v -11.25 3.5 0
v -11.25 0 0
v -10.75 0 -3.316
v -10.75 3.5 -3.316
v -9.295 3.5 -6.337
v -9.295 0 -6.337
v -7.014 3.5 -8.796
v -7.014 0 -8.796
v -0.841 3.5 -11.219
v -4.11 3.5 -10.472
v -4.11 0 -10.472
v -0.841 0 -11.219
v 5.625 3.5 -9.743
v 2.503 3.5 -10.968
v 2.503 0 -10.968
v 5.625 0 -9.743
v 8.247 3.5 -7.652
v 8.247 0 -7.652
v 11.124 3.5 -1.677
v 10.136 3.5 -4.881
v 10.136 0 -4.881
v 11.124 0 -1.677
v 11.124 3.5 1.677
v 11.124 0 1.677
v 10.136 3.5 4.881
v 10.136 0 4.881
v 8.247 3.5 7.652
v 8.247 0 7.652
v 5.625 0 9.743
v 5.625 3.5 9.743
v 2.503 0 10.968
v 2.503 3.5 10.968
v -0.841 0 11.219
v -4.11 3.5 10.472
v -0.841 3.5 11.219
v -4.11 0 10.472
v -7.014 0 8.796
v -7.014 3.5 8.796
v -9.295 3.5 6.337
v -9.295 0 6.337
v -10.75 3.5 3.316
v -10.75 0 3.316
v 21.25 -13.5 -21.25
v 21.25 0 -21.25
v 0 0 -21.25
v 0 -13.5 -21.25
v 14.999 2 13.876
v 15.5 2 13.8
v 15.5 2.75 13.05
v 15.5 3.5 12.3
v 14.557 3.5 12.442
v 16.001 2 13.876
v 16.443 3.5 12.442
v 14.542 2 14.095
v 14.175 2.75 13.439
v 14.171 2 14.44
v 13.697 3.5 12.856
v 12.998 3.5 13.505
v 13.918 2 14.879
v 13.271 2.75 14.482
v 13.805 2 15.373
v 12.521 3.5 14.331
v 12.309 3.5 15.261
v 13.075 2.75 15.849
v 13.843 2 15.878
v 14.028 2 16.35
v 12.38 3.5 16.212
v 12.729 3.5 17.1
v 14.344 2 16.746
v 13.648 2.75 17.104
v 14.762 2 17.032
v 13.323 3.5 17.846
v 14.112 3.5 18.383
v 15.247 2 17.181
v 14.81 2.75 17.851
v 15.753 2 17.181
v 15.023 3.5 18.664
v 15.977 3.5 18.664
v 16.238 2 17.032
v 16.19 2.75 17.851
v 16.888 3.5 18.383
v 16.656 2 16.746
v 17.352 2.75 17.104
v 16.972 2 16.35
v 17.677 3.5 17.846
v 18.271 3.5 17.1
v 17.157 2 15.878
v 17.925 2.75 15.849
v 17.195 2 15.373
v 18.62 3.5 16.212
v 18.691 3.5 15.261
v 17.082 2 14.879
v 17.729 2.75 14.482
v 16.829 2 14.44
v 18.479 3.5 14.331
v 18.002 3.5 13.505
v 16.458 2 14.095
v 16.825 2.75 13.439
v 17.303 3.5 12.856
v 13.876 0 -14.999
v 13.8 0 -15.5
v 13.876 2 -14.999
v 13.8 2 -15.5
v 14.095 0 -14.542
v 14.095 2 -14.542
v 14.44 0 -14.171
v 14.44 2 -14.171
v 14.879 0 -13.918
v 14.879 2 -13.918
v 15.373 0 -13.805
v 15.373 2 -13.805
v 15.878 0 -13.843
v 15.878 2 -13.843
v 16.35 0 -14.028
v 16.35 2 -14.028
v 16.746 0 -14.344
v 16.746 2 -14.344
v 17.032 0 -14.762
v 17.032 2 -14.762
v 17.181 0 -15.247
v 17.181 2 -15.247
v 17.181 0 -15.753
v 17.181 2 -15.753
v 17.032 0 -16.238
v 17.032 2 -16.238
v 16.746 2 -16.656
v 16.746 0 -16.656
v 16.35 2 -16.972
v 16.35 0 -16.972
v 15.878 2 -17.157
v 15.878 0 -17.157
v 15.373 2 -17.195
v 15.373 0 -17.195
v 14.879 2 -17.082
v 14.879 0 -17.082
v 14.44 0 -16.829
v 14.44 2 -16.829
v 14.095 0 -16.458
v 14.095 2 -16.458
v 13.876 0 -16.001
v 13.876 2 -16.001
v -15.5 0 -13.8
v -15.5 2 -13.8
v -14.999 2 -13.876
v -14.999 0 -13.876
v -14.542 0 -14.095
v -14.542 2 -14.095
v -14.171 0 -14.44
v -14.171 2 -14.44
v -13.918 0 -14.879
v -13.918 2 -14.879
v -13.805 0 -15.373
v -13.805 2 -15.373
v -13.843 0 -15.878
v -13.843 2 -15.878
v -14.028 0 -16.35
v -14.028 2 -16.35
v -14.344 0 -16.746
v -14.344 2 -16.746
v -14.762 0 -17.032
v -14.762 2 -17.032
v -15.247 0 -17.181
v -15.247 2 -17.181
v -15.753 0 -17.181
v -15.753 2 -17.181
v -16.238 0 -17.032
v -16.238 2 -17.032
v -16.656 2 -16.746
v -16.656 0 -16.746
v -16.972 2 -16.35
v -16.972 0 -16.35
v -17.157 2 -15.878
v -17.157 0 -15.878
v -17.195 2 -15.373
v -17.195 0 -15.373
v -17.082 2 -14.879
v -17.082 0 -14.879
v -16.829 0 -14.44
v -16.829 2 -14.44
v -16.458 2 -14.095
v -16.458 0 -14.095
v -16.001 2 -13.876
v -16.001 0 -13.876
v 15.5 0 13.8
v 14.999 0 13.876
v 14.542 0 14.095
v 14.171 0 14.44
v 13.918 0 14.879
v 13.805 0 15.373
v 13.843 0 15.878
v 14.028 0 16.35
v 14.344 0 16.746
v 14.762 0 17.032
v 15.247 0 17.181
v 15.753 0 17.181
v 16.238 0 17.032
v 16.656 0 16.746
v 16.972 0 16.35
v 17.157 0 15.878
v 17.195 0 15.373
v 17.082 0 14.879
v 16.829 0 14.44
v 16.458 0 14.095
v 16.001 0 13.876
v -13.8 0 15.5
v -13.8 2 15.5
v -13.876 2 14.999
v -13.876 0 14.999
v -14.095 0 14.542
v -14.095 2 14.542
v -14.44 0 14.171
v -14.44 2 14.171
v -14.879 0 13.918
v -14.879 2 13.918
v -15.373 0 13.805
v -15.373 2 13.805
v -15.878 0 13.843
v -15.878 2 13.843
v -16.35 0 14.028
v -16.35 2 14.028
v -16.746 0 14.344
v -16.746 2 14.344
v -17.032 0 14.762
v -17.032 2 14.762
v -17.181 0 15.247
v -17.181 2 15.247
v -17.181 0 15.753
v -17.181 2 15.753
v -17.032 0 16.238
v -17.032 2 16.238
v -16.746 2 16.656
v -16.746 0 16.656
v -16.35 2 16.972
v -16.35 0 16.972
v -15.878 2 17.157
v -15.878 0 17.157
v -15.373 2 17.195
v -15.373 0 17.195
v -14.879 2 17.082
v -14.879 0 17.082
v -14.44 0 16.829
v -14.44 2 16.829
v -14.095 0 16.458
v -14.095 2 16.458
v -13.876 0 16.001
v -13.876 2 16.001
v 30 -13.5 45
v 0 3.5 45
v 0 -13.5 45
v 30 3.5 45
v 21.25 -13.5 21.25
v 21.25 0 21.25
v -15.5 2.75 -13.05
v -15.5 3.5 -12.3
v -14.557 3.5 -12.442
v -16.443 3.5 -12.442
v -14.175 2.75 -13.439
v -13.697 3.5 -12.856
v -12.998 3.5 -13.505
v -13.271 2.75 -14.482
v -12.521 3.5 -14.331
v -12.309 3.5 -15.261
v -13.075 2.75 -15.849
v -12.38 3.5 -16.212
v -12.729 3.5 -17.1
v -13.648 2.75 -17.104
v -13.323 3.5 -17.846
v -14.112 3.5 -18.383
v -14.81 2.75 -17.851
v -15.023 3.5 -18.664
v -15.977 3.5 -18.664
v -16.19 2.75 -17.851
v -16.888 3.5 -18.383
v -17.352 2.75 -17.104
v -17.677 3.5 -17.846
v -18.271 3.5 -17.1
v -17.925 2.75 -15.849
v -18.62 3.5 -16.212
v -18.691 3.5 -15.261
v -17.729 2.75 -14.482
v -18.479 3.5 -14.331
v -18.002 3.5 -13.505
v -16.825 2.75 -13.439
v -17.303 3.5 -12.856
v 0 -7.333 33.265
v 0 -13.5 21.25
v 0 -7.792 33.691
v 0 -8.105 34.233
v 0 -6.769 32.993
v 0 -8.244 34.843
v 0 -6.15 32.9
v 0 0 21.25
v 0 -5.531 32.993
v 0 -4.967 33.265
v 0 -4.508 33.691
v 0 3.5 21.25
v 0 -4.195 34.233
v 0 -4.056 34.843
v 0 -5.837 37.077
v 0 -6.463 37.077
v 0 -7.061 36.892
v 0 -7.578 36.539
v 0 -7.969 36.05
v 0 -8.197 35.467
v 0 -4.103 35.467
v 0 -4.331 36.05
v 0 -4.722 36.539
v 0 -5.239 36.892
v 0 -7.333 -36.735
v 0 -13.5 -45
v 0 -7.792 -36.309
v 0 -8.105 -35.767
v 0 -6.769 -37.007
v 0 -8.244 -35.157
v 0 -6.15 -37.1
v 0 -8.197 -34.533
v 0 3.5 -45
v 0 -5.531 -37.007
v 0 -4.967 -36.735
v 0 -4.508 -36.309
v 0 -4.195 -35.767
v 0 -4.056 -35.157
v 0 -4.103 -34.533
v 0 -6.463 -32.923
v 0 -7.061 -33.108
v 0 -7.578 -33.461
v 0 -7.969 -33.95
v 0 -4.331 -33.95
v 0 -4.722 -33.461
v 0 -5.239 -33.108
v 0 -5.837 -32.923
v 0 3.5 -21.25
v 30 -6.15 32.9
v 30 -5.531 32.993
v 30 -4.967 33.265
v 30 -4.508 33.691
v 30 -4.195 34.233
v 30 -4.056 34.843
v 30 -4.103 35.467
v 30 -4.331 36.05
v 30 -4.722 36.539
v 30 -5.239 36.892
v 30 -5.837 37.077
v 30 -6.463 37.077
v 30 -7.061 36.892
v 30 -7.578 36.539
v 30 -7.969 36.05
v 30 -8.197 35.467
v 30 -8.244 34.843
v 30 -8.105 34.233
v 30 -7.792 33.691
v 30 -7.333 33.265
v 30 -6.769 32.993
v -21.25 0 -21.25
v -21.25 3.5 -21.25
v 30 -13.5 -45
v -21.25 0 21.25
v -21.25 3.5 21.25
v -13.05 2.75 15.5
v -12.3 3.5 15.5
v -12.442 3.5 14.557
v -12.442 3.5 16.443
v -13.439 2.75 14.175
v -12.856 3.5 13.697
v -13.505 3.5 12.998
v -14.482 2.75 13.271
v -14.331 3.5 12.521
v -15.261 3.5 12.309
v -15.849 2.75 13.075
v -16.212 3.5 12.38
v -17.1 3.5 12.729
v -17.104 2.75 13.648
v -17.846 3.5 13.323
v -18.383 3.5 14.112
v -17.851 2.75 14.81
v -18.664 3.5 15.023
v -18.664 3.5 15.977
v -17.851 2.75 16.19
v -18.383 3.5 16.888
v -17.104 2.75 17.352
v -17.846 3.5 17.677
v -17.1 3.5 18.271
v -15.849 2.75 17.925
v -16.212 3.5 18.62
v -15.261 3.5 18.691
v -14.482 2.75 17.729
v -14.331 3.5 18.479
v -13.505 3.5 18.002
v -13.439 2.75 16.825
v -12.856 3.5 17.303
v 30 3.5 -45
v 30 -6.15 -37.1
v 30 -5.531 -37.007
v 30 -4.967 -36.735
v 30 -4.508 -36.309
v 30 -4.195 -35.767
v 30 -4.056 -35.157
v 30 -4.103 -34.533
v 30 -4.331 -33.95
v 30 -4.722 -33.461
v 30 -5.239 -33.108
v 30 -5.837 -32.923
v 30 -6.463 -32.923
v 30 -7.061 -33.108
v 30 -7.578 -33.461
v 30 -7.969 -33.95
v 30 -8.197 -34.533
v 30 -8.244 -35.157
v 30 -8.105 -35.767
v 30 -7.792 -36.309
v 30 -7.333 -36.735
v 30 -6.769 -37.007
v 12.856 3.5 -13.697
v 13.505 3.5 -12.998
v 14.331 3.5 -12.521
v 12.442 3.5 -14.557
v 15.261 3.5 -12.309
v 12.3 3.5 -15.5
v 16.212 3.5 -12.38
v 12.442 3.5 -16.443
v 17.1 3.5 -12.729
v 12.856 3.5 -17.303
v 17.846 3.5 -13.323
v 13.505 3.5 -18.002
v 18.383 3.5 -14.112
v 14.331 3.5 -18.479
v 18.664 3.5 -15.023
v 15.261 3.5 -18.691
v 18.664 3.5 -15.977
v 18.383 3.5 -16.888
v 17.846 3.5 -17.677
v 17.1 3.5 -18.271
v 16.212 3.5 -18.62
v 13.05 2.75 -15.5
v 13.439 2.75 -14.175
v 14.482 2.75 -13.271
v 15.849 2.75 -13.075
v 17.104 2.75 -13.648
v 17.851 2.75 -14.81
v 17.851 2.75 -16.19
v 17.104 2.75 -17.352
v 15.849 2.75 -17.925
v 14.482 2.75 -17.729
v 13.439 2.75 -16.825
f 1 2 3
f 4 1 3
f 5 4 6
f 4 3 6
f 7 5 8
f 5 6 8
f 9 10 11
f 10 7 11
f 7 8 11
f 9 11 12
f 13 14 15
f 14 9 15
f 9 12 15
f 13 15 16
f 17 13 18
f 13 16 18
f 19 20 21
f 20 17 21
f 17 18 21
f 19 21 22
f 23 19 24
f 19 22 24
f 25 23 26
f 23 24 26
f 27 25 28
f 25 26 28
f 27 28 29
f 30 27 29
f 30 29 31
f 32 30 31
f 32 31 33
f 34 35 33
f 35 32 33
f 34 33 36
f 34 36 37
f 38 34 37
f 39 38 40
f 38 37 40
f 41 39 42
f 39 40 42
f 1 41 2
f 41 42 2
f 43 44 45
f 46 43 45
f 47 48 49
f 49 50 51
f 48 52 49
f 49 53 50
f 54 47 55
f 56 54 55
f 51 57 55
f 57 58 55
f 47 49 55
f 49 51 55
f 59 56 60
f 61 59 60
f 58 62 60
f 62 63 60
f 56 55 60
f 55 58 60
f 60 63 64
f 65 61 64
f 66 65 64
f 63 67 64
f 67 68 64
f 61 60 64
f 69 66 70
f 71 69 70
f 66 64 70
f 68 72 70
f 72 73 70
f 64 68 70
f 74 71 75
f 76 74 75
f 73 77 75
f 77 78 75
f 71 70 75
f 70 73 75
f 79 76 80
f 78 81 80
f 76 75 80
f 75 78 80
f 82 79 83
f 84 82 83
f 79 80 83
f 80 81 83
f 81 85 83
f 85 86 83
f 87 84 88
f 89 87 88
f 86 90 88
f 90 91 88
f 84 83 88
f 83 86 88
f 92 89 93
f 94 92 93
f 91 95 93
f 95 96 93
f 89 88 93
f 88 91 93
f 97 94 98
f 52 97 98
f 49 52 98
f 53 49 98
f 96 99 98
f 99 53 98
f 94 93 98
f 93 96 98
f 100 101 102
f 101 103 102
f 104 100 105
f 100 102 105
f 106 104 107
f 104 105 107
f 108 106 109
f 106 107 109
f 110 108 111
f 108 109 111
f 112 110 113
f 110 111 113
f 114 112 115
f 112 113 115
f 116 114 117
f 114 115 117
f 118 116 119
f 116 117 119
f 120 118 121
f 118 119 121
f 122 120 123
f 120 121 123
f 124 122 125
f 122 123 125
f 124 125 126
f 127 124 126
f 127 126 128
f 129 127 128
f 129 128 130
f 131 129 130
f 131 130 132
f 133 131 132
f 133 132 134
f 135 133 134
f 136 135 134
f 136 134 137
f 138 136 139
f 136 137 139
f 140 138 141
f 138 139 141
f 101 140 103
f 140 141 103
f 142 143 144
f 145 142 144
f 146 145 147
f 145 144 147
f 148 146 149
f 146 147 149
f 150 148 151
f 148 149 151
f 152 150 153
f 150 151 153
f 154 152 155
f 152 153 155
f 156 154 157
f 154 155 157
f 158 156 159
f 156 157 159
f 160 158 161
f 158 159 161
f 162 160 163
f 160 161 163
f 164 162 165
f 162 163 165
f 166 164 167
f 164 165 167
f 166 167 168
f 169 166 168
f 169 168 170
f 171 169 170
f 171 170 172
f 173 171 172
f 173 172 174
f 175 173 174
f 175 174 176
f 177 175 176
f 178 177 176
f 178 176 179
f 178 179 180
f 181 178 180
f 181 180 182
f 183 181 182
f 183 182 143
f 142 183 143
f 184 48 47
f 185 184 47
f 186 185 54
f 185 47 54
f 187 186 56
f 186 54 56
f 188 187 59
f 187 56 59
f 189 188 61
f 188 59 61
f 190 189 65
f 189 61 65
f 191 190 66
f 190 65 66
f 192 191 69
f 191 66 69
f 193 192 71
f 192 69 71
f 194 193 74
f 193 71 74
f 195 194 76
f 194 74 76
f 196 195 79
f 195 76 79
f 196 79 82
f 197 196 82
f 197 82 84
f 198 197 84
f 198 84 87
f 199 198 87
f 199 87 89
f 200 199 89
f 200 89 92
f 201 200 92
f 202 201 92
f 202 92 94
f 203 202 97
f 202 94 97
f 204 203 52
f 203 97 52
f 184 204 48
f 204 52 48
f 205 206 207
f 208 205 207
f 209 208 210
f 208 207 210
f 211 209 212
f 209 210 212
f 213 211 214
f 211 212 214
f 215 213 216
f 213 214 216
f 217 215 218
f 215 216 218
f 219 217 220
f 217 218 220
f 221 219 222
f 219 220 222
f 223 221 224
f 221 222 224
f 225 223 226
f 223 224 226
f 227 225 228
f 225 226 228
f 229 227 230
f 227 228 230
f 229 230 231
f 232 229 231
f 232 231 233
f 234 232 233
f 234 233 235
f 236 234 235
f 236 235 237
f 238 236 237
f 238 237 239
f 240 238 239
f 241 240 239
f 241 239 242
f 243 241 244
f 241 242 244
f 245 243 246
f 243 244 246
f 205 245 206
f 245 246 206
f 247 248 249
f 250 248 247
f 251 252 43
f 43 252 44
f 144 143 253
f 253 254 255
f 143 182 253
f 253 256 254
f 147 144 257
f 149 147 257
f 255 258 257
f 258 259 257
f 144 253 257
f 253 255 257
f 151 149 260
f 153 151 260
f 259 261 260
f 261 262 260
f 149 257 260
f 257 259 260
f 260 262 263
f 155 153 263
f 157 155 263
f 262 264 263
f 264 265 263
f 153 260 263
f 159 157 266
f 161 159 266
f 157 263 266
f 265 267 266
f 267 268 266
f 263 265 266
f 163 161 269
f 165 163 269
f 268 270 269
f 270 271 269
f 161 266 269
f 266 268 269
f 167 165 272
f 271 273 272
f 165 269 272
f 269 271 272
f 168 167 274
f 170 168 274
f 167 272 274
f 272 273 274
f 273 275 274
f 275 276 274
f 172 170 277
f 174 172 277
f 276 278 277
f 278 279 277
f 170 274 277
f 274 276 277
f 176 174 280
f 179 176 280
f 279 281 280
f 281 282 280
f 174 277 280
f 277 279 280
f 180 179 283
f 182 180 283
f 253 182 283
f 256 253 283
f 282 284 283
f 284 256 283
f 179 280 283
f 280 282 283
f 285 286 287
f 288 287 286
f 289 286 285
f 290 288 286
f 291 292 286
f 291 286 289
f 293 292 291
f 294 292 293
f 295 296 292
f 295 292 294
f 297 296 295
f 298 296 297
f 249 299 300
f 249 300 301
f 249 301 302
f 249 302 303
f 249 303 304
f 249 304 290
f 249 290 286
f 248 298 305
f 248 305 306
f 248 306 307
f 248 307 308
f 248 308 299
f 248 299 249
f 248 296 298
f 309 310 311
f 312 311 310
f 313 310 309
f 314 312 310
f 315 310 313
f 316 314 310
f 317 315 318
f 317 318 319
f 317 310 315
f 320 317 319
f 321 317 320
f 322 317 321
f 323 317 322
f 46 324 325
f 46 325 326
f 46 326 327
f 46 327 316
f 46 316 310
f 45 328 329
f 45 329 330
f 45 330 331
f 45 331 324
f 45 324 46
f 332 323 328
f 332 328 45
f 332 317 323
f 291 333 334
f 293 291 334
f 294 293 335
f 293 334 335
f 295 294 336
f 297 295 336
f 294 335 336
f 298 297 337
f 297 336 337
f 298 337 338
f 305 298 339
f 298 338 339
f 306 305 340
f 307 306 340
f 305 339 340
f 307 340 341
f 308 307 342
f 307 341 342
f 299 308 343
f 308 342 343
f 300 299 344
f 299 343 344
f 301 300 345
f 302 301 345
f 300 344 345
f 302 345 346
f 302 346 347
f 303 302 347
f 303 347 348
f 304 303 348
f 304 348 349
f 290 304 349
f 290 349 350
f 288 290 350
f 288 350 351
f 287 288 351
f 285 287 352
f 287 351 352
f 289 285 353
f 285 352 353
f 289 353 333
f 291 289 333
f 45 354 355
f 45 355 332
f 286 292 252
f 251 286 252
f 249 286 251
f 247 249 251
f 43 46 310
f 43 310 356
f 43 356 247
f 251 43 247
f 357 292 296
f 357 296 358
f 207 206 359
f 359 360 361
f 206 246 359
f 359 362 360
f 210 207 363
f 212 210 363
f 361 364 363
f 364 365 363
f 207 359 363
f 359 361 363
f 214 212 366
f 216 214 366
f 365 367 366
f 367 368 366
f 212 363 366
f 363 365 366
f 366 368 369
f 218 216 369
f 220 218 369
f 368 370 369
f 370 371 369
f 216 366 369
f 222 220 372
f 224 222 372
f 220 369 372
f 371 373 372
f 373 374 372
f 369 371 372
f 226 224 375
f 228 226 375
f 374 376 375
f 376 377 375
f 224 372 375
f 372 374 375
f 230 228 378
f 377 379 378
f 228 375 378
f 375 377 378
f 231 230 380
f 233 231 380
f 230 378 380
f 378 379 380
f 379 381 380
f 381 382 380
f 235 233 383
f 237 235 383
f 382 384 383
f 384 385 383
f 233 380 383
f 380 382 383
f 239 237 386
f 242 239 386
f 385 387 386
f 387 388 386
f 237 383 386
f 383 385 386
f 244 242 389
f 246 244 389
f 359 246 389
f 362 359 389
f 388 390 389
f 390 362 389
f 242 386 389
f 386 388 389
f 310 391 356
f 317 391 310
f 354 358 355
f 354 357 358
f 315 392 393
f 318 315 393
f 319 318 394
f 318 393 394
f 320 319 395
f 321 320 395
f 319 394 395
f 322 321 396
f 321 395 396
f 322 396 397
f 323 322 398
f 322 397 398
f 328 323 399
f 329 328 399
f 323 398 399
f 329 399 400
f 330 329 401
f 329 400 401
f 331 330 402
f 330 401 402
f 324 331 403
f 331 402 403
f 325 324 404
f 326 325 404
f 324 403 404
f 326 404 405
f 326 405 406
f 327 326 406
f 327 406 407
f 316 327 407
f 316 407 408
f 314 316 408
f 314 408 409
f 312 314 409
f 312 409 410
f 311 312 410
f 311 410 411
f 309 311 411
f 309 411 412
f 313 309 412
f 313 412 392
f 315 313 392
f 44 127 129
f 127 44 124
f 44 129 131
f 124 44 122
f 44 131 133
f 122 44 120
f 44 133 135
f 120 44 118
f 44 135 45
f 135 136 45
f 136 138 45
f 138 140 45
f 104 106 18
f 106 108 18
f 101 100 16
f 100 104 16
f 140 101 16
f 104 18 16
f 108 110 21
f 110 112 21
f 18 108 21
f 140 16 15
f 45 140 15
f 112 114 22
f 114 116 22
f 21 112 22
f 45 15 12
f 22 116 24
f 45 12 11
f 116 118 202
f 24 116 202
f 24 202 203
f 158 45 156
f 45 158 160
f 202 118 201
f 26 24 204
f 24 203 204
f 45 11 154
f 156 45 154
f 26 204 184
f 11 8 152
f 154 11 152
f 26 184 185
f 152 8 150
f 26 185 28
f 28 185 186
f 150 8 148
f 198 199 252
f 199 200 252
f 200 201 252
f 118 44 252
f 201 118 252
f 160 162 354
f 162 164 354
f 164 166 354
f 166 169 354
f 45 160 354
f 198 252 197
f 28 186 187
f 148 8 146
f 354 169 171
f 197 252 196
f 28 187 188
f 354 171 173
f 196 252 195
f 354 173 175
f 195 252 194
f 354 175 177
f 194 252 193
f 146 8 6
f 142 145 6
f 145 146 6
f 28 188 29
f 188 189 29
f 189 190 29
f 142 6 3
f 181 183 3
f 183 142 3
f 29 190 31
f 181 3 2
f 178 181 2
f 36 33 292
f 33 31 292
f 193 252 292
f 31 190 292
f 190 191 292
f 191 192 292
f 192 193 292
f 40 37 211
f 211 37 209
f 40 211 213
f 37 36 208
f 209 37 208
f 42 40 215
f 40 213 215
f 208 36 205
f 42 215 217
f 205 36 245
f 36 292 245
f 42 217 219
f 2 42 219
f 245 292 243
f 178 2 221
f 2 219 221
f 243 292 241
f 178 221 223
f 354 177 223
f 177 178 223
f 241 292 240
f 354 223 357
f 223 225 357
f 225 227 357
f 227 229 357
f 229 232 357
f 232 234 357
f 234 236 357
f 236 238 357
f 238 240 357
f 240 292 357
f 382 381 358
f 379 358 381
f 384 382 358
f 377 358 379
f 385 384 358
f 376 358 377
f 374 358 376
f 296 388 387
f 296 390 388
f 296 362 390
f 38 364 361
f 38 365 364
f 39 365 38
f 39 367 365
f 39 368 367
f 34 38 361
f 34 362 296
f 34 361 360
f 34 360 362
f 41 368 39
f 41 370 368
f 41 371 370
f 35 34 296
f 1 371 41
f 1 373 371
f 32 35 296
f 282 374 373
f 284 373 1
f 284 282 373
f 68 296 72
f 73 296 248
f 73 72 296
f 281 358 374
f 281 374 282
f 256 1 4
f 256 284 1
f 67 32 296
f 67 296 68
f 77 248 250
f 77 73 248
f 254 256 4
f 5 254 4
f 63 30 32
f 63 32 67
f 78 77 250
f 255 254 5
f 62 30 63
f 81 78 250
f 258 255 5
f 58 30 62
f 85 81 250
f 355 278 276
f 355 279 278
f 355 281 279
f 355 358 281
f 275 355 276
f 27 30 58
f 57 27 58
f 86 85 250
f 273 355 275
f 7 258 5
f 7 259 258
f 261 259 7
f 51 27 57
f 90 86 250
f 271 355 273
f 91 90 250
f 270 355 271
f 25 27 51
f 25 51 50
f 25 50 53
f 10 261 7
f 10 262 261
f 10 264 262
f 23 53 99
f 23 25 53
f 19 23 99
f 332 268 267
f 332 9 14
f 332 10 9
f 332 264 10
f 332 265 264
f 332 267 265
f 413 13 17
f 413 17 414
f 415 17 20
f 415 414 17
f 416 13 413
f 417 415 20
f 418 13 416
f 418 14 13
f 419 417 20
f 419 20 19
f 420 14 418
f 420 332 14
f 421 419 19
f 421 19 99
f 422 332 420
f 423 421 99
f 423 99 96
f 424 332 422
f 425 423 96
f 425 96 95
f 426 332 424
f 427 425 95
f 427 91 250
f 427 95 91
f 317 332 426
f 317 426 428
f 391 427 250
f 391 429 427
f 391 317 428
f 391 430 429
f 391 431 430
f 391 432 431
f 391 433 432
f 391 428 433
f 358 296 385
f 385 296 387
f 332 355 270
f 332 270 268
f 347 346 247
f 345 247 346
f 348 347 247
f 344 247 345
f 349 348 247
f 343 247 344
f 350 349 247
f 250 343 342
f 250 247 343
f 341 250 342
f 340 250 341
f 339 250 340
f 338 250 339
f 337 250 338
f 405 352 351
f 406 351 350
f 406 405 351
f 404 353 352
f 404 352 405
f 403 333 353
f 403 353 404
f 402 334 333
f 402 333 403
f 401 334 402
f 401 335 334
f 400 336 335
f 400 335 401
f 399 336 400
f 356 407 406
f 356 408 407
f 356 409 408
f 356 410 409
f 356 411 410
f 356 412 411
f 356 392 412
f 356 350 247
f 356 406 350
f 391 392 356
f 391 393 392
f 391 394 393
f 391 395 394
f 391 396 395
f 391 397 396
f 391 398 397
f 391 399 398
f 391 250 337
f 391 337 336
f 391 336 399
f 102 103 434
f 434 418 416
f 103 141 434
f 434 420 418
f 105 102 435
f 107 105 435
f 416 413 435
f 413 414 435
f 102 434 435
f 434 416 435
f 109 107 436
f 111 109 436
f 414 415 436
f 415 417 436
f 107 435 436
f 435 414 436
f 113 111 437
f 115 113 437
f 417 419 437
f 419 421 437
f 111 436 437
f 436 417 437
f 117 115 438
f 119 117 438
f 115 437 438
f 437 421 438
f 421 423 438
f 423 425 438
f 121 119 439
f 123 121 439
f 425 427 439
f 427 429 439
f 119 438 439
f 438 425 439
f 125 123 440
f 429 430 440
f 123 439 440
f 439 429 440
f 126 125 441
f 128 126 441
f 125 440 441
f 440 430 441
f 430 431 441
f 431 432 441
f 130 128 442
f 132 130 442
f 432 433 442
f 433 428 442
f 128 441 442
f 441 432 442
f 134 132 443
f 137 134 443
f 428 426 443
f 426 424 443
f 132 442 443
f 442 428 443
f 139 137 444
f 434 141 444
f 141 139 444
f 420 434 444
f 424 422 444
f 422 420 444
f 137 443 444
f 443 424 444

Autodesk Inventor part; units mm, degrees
ref_plane "YZ Plane" through (0, 0, 0) normal (1, 0, 0) x (0, 1, 0)
ref_plane "XZ Plane" through (0, 0, 0) normal (0, 1, 0) x (-1, 0, 0)
ref_plane "XY Plane" through (0, 0, 0) normal (0, 0, 1) x (1, 0, 0)
sketch "Boceto1" plane through (0, 0, 0) normal (0, 1, 0) x (-1, 0, 0)
  circle A0 centre (0, 0) radius 11.25
  line L0 (-21.25, 21.25) -> (21.25, 21.25)
  line L1 (21.25, 21.25) -> (21.25, -21.25)
  line L2 (21.25, -21.25) -> (-21.25, -21.25)
  line L3 (-21.25, -21.25) -> (-21.25, 21.25)
  line L4 (-21.25, 21.25) -> (21.25, -21.25) construction
  line L5 (21.25, 21.25) -> (-21.25, -21.25) construction
  dimension "d0" = 22.5
  dimension "d1" = 42.5
  dimension "d2" = 42.5
extrude "Extrusión1" add sketch "Boceto1" along normal blind 3.5
sketch "Boceto2" plane through (0, 3.5, 0) normal (0, 1, 0) x (1, 0, 0)
  circle A0 centre (-15.5, -15.5) radius 1.7
  point P0 (0, 0)
  dimension "d5" = 15.5
  dimension "d6" = 15.5
  dimension "d7" = 3.4
extrude "Extrusión2" cut sketch "Boceto2" against normal through all
chamfer "Chaflán1" distance 1.5 angle 45 1 edges at (-17.2, 3.5, 15.5)
pattern_circular "Patrón circular1" count 4 over 360 about axis through (0, 0, 0) along (0, 1, 0) of "Extrusión2", "Chaflán1"
sketch "Boceto3" plane through (0, 3.5, 0) normal (0, 1, 0) x (1, 0, 0)
  circle A0 centre (15.5, 15.5) radius 3.2 projected
  circle A1 centre (-15.5, -15.5) radius 3.2 projected
  line L0 (21.25, 21.25) -> (-21.25, 21.25) projected
  line L1 (-21.25, 21.25) -> (-21.25, -21.25) projected
  line L2 (-21.25, -21.25) -> (21.25, -21.25) projected
  line L3 (21.25, -21.25) -> (21.25, 21.25) projected
  circle A2 centre (0, 0) radius 11.25 projected
  circle A3 centre (15.5, -15.5) radius 3.2 projected
  circle A4 centre (-15.5, 15.5) radius 3.2 projected
  line L4 (0, -45) -> (30, -45)
  line L5 (30, -45) -> (30, 45)
  line L6 (30, 45) -> (0, 45)
  line L7 (0, 45) -> (0, -45)
  point P0 (0, -21.25)
  point P1 (0, 21.25)
  dimension "d16" = 90
  dimension "d17" = 45
  dimension "d18" = 0
  dimension "d19" = 30
extrude "Extrusión3" add sketch "Boceto3" against normal blind 17 contours L0 L7 L6 L5 L4 L2 L3
sketch "Boceto4" plane through (30, 3.5, 45) normal (1, 0, 0) x (0, 0, -1)
  circle A0 centre (10, -9.65) radius 2.1 projected
  circle A1 centre (80, -9.65) radius 2.1 projected
  point P0 (45, -3.5)
extrude "Extrusión4" cut sketch "Boceto4" against normal through all
properties part number "shoulder motor support"
